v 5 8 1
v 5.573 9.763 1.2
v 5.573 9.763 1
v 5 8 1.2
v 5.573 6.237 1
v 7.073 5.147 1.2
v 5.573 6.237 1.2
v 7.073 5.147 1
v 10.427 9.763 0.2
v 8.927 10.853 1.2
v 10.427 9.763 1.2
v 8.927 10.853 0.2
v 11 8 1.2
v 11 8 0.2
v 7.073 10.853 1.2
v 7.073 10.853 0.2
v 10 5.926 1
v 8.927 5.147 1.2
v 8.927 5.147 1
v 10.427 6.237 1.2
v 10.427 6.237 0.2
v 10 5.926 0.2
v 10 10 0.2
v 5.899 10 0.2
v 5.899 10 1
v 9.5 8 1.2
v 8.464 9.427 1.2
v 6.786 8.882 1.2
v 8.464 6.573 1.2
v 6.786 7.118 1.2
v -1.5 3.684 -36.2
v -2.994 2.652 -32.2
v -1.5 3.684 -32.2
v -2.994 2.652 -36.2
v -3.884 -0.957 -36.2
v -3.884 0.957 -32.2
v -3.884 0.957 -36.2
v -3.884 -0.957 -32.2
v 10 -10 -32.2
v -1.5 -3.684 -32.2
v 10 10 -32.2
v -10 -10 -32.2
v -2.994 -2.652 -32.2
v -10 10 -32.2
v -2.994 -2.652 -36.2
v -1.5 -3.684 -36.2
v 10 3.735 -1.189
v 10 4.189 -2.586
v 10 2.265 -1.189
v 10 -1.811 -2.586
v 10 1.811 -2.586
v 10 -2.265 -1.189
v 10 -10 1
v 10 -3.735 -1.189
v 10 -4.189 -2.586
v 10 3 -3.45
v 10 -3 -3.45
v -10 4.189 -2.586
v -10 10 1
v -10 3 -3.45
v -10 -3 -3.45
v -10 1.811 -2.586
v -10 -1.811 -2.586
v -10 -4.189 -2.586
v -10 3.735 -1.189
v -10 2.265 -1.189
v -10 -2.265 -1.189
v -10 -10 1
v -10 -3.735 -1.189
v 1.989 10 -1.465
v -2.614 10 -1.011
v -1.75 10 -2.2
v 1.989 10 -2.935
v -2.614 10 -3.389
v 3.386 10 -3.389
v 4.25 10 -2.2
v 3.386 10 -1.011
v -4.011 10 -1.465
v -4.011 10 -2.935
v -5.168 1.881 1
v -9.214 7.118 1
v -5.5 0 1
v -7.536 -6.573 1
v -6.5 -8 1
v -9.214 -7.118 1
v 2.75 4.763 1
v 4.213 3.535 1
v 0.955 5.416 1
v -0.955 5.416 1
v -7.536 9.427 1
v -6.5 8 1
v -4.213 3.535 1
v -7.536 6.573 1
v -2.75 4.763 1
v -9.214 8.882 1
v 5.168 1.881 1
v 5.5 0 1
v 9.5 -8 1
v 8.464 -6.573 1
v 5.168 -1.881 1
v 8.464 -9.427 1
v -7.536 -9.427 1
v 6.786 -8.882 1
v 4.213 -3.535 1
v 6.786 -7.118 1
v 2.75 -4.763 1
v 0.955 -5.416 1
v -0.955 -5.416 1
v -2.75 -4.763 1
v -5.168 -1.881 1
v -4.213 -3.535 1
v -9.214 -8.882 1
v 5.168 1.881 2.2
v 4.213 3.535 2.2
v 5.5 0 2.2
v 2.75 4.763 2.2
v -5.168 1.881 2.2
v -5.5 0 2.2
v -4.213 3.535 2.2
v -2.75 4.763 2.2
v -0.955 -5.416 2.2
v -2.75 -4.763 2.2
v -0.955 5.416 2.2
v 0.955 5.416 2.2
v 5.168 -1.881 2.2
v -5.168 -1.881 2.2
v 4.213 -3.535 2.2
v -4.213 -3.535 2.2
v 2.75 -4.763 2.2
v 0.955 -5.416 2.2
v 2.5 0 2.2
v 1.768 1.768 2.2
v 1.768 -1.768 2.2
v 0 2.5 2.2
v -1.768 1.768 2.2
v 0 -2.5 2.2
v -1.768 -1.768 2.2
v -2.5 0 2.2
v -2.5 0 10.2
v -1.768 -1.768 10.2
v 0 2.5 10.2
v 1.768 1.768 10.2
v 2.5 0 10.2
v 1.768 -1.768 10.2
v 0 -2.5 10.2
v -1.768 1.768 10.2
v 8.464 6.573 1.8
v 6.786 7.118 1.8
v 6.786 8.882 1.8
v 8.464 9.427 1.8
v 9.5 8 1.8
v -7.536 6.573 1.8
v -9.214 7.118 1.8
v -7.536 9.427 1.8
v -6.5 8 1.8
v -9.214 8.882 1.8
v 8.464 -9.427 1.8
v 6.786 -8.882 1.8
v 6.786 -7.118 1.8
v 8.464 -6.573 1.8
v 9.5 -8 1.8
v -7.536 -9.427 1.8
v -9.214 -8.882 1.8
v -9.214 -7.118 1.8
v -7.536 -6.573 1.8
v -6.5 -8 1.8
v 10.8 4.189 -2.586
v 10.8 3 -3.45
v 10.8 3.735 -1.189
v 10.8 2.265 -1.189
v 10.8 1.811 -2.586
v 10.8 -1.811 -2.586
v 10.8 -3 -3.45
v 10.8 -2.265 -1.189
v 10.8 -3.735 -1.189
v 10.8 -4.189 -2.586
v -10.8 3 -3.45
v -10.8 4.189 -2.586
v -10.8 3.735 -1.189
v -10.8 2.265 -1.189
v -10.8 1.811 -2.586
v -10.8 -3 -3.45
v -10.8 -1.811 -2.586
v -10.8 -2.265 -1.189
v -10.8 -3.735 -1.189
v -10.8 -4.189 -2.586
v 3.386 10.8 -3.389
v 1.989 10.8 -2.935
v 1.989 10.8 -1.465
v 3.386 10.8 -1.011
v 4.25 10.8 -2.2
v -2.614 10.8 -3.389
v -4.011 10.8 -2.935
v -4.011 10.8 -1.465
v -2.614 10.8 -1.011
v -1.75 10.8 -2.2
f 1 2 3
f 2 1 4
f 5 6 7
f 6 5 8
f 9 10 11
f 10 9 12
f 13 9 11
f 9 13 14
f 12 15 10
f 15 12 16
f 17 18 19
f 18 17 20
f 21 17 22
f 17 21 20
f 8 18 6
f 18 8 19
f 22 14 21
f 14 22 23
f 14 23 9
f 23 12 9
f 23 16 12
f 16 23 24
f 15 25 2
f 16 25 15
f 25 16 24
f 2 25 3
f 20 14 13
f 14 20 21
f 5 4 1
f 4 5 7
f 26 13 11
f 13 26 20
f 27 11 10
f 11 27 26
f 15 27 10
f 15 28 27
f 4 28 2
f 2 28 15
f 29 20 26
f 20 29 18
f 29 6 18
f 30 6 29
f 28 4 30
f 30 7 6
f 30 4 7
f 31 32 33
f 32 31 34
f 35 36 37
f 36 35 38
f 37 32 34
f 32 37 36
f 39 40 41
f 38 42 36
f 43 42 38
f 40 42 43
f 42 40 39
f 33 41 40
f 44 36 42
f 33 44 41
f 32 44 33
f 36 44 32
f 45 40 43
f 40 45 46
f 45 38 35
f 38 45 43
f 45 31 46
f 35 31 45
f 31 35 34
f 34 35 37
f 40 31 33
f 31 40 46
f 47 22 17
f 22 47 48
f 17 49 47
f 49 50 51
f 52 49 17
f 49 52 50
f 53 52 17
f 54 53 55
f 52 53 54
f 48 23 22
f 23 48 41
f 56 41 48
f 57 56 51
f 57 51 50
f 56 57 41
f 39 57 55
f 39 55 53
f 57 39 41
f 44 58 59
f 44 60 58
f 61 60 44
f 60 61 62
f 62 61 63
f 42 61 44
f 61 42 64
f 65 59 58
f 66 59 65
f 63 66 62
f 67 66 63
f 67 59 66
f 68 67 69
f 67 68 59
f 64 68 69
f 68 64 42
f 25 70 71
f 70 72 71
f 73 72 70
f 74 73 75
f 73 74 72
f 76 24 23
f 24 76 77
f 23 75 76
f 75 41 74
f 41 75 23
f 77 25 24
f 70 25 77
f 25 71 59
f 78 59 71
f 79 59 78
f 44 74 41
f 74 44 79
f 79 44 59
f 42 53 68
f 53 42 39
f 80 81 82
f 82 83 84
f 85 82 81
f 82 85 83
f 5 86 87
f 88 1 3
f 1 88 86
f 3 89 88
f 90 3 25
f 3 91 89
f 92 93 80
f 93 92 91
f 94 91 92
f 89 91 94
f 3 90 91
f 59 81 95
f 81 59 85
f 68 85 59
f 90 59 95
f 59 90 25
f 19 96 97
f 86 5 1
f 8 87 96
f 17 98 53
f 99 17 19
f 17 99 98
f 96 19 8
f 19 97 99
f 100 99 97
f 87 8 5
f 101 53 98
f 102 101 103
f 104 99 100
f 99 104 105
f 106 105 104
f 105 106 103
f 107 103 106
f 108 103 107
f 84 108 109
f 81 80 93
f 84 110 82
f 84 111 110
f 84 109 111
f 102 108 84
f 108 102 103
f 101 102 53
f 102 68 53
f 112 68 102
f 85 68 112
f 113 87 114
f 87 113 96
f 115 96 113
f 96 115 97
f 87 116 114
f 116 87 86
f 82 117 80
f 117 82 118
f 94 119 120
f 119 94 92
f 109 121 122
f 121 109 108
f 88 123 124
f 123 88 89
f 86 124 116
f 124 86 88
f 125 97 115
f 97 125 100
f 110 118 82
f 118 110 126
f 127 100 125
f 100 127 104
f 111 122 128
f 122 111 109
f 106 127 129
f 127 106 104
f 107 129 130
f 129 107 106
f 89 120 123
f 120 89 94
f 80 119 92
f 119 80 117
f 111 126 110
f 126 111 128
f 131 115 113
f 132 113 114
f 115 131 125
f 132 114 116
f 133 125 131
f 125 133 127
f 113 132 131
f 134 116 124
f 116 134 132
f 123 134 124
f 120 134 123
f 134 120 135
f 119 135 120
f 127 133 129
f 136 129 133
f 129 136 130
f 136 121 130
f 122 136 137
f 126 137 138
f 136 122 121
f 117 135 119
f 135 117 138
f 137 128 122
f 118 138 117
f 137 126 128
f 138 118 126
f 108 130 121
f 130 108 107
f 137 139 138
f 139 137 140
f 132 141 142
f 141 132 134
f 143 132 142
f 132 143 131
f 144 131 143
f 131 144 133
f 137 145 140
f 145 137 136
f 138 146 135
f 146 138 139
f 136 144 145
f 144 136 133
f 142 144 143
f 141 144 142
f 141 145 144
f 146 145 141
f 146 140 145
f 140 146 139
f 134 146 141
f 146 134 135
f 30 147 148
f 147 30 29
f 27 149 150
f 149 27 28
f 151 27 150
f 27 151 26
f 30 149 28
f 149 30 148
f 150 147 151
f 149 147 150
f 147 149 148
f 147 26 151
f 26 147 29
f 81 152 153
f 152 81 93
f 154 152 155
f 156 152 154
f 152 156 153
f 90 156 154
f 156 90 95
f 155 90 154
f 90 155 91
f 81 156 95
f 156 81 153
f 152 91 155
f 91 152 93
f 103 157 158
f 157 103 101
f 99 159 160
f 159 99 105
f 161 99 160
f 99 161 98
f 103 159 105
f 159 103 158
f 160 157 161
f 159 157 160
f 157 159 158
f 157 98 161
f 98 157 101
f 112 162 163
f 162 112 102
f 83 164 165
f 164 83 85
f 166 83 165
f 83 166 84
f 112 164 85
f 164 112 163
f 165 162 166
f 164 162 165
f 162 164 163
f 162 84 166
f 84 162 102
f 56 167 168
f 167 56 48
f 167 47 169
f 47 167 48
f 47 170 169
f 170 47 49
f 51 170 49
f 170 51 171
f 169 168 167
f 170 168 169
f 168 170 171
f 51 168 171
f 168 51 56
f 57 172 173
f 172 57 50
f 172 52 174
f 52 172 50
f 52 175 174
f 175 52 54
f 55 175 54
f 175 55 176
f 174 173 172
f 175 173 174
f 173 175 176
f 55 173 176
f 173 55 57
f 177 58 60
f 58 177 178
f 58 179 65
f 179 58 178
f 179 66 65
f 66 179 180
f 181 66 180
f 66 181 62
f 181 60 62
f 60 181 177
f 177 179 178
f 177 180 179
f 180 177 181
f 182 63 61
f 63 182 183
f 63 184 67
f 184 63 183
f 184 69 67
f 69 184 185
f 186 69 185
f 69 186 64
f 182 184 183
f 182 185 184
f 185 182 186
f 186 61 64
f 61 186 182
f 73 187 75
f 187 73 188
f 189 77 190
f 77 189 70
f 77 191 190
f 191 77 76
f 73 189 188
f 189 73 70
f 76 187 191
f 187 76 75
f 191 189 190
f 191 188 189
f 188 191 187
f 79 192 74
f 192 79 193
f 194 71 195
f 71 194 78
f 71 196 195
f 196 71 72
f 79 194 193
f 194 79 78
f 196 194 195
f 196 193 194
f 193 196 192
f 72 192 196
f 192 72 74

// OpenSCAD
// Parameters
face_width = 20; //[10:40:0.5]
body_length = 30; //[15:60:0.5]
body_width = 20; //[10:40:0.5]
body_height = 20; //[10:40:0.5]
front_face_thickness = 2; //[1:6:0.25]
rear_cap_thickness = 2; //[1:6:0.25]
shaft_diameter = 5; //[2.5:10:0.1]
shaft_length = 10; //[5:30:0.5]
boss_diameter = 11; //[6:22:0.5]
boss_thickness = 2; //[1:8:0.25]
mount_hole_spacing = 16; //[8:32:0.5]
mount_hole_diameter = 3; //[1.5:6:0.1]
mount_hole_depth = 6; //[2:20:0.5]
corner_radius = 1; //[0:4:0.25]
eps = 0.8; //[0.2:2:0.1]
ttrack_length = 18; //[10:60:1]
ttrack_pitch = 6; //[3:20:0.5]
rail_length = 18; //[10:60:1]
rail_pitch = 6; //[3:20:0.5]
aux_hole_diameter = 2.5; //[1:6:0.1]
aux_hole_depth = 4; //[1:15:0.5]
d_plug_diameter = 8; //[4:16:0.5]
d_flat_depth = 1.5; //[0.5:4:0.25]
d_plug_length = 4; //[2:12:0.5]
screw_shank_diameter = 3; //[1.5:6:0.1]
screw_length = 8; //[4:25:0.5]
washer_diameter = 6; //[3:14:0.5]
washer_thickness = 1; //[0.5:3:0.25]

// Modules
module ttrack_hole_positions() {
  color("Silver") {
    union() {
      translate([face_width/2 - aux_hole_depth/2, ttrack_pitch/2, -front_face_thickness/2 - aux_hole_depth/2 + eps])
        rotate([0, 90, 0]) cylinder(r=aux_hole_diameter/2, h=aux_hole_depth + 2*eps, center=true);
      translate([face_width/2 - aux_hole_depth/2, -ttrack_pitch/2, -front_face_thickness/2 - aux_hole_depth/2 + eps])
        rotate([0, 90, 0]) cylinder(r=aux_hole_diameter/2, h=aux_hole_depth + 2*eps, center=true);
    }
  }
}

module screw_and_washer() {
  color("DimGray") {
    union() {
      translate([mount_hole_spacing/2, mount_hole_spacing/2, -front_face_thickness/2 - screw_length/2 + eps])
        cylinder(r=screw_shank_diameter/2, h=screw_length, center=true);
      translate([mount_hole_spacing/2, mount_hole_spacing/2, front_face_thickness/2 + washer_thickness/2 - eps])
        cylinder(r=washer_diameter/2, h=washer_thickness, center=true);
    }
  }
}

module rail_hole_positions() {
  color("Silver") {
    union() {
      translate([-face_width/2 + aux_hole_depth/2, rail_pitch/2, -front_face_thickness/2 - aux_hole_depth/2 + eps])
        rotate([0, 90, 0]) cylinder(r=aux_hole_diameter/2, h=aux_hole_depth + 2*eps, center=true);
      translate([-face_width/2 + aux_hole_depth/2, -rail_pitch/2, -front_face_thickness/2 - aux_hole_depth/2 + eps])
        rotate([0, 90, 0]) cylinder(r=aux_hole_diameter/2, h=aux_hole_depth + 2*eps, center=true);
    }
  }
}

module d_plug_D() {
  color("Silver") {
    difference() {
      translate([0, 0, -front_face_thickness/2 - body_length - rear_cap_thickness - d_plug_length/2 + eps])
        cylinder(r=d_plug_diameter/2, h=d_plug_length, center=true);
      translate([d_plug_diameter/2 - d_flat_depth, 0, -front_face_thickness/2 - body_length - rear_cap_thickness - d_plug_length/2 + eps])
        cube([d_plug_diameter, d_plug_diameter, d_plug_length + 2*eps], center=true);
    }
  }
}

module ttrack_insert_hole_positions() {
  color("Silver") {
    union() {
      translate([ttrack_pitch/2, face_width/2 - aux_hole_depth/2, -front_face_thickness/2 - aux_hole_depth/2 + eps])
        rotate([90, 0, 0]) cylinder(r=aux_hole_diameter/2, h=aux_hole_depth + 2*eps, center=true);
      translate([-ttrack_pitch/2, face_width/2 - aux_hole_depth/2, -front_face_thickness/2 - aux_hole_depth/2 + eps])
        rotate([90, 0, 0]) cylinder(r=aux_hole_diameter/2, h=aux_hole_depth + 2*eps, center=true);
    }
  }
}

module assembly() {
  color("Black") {
    union() {
      // Motor Body
      translate([0, 0, -front_face_thickness/2 - body_length/2 + eps])
        cube([body_width, body_height, body_length], center=true);
      // Front Face
      translate([0, 0, 0])
        cube([face_width, face_width, front_face_thickness], center=true);
      // Rear Cap Face
      translate([0, 0, -front_face_thickness/2 - body_length - rear_cap_thickness/2 + eps])
        cube([face_width, face_width, rear_cap_thickness], center=true);
      // Shaft Boss
      translate([0, 0, front_face_thickness/2 + boss_thickness/2 - eps])
        cylinder(r=boss_diameter/2, h=boss_thickness, center=true);
      // Output Shaft
      translate([0, 0, front_face_thickness/2 + shaft_length/2 - eps])
        cylinder(r=shaft_diameter/2, h=shaft_length, center=true);
      // Screw and Washer
      screw_and_washer();
      // D Plug
      d_plug_D();
    }
  }
  // Holes
  difference() {
    union() {
      // Mounting Holes
      union() {
        translate([mount_hole_spacing/2, mount_hole_spacing/2, -mount_hole_depth/2])
          cylinder(r=mount_hole_diameter/2, h=front_face_thickness + mount_hole_depth + 2*eps, center=true);
        translate([-mount_hole_spacing/2, mount_hole_spacing/2, -mount_hole_depth/2])
          cylinder(r=mount_hole_diameter/2, h=front_face_thickness + mount_hole_depth + 2*eps, center=true);
        translate([mount_hole_spacing/2, -mount_hole_spacing/2, -mount_hole_depth/2])
          cylinder(r=mount_hole_diameter/2, h=front_face_thickness + mount_hole_depth + 2*eps, center=true);
        translate([-mount_hole_spacing/2, -mount_hole_spacing/2, -mount_hole_depth/2])
          cylinder(r=mount_hole_diameter/2, h=front_face_thickness + mount_hole_depth + 2*eps, center=true);
      }
      // Ttrack Hole Positions
      ttrack_hole_positions();
      // Rail Hole Positions
      rail_hole_positions();
      // Ttrack Insert Hole Positions
      ttrack_insert_hole_positions();
    }
  }
}

assembly();
